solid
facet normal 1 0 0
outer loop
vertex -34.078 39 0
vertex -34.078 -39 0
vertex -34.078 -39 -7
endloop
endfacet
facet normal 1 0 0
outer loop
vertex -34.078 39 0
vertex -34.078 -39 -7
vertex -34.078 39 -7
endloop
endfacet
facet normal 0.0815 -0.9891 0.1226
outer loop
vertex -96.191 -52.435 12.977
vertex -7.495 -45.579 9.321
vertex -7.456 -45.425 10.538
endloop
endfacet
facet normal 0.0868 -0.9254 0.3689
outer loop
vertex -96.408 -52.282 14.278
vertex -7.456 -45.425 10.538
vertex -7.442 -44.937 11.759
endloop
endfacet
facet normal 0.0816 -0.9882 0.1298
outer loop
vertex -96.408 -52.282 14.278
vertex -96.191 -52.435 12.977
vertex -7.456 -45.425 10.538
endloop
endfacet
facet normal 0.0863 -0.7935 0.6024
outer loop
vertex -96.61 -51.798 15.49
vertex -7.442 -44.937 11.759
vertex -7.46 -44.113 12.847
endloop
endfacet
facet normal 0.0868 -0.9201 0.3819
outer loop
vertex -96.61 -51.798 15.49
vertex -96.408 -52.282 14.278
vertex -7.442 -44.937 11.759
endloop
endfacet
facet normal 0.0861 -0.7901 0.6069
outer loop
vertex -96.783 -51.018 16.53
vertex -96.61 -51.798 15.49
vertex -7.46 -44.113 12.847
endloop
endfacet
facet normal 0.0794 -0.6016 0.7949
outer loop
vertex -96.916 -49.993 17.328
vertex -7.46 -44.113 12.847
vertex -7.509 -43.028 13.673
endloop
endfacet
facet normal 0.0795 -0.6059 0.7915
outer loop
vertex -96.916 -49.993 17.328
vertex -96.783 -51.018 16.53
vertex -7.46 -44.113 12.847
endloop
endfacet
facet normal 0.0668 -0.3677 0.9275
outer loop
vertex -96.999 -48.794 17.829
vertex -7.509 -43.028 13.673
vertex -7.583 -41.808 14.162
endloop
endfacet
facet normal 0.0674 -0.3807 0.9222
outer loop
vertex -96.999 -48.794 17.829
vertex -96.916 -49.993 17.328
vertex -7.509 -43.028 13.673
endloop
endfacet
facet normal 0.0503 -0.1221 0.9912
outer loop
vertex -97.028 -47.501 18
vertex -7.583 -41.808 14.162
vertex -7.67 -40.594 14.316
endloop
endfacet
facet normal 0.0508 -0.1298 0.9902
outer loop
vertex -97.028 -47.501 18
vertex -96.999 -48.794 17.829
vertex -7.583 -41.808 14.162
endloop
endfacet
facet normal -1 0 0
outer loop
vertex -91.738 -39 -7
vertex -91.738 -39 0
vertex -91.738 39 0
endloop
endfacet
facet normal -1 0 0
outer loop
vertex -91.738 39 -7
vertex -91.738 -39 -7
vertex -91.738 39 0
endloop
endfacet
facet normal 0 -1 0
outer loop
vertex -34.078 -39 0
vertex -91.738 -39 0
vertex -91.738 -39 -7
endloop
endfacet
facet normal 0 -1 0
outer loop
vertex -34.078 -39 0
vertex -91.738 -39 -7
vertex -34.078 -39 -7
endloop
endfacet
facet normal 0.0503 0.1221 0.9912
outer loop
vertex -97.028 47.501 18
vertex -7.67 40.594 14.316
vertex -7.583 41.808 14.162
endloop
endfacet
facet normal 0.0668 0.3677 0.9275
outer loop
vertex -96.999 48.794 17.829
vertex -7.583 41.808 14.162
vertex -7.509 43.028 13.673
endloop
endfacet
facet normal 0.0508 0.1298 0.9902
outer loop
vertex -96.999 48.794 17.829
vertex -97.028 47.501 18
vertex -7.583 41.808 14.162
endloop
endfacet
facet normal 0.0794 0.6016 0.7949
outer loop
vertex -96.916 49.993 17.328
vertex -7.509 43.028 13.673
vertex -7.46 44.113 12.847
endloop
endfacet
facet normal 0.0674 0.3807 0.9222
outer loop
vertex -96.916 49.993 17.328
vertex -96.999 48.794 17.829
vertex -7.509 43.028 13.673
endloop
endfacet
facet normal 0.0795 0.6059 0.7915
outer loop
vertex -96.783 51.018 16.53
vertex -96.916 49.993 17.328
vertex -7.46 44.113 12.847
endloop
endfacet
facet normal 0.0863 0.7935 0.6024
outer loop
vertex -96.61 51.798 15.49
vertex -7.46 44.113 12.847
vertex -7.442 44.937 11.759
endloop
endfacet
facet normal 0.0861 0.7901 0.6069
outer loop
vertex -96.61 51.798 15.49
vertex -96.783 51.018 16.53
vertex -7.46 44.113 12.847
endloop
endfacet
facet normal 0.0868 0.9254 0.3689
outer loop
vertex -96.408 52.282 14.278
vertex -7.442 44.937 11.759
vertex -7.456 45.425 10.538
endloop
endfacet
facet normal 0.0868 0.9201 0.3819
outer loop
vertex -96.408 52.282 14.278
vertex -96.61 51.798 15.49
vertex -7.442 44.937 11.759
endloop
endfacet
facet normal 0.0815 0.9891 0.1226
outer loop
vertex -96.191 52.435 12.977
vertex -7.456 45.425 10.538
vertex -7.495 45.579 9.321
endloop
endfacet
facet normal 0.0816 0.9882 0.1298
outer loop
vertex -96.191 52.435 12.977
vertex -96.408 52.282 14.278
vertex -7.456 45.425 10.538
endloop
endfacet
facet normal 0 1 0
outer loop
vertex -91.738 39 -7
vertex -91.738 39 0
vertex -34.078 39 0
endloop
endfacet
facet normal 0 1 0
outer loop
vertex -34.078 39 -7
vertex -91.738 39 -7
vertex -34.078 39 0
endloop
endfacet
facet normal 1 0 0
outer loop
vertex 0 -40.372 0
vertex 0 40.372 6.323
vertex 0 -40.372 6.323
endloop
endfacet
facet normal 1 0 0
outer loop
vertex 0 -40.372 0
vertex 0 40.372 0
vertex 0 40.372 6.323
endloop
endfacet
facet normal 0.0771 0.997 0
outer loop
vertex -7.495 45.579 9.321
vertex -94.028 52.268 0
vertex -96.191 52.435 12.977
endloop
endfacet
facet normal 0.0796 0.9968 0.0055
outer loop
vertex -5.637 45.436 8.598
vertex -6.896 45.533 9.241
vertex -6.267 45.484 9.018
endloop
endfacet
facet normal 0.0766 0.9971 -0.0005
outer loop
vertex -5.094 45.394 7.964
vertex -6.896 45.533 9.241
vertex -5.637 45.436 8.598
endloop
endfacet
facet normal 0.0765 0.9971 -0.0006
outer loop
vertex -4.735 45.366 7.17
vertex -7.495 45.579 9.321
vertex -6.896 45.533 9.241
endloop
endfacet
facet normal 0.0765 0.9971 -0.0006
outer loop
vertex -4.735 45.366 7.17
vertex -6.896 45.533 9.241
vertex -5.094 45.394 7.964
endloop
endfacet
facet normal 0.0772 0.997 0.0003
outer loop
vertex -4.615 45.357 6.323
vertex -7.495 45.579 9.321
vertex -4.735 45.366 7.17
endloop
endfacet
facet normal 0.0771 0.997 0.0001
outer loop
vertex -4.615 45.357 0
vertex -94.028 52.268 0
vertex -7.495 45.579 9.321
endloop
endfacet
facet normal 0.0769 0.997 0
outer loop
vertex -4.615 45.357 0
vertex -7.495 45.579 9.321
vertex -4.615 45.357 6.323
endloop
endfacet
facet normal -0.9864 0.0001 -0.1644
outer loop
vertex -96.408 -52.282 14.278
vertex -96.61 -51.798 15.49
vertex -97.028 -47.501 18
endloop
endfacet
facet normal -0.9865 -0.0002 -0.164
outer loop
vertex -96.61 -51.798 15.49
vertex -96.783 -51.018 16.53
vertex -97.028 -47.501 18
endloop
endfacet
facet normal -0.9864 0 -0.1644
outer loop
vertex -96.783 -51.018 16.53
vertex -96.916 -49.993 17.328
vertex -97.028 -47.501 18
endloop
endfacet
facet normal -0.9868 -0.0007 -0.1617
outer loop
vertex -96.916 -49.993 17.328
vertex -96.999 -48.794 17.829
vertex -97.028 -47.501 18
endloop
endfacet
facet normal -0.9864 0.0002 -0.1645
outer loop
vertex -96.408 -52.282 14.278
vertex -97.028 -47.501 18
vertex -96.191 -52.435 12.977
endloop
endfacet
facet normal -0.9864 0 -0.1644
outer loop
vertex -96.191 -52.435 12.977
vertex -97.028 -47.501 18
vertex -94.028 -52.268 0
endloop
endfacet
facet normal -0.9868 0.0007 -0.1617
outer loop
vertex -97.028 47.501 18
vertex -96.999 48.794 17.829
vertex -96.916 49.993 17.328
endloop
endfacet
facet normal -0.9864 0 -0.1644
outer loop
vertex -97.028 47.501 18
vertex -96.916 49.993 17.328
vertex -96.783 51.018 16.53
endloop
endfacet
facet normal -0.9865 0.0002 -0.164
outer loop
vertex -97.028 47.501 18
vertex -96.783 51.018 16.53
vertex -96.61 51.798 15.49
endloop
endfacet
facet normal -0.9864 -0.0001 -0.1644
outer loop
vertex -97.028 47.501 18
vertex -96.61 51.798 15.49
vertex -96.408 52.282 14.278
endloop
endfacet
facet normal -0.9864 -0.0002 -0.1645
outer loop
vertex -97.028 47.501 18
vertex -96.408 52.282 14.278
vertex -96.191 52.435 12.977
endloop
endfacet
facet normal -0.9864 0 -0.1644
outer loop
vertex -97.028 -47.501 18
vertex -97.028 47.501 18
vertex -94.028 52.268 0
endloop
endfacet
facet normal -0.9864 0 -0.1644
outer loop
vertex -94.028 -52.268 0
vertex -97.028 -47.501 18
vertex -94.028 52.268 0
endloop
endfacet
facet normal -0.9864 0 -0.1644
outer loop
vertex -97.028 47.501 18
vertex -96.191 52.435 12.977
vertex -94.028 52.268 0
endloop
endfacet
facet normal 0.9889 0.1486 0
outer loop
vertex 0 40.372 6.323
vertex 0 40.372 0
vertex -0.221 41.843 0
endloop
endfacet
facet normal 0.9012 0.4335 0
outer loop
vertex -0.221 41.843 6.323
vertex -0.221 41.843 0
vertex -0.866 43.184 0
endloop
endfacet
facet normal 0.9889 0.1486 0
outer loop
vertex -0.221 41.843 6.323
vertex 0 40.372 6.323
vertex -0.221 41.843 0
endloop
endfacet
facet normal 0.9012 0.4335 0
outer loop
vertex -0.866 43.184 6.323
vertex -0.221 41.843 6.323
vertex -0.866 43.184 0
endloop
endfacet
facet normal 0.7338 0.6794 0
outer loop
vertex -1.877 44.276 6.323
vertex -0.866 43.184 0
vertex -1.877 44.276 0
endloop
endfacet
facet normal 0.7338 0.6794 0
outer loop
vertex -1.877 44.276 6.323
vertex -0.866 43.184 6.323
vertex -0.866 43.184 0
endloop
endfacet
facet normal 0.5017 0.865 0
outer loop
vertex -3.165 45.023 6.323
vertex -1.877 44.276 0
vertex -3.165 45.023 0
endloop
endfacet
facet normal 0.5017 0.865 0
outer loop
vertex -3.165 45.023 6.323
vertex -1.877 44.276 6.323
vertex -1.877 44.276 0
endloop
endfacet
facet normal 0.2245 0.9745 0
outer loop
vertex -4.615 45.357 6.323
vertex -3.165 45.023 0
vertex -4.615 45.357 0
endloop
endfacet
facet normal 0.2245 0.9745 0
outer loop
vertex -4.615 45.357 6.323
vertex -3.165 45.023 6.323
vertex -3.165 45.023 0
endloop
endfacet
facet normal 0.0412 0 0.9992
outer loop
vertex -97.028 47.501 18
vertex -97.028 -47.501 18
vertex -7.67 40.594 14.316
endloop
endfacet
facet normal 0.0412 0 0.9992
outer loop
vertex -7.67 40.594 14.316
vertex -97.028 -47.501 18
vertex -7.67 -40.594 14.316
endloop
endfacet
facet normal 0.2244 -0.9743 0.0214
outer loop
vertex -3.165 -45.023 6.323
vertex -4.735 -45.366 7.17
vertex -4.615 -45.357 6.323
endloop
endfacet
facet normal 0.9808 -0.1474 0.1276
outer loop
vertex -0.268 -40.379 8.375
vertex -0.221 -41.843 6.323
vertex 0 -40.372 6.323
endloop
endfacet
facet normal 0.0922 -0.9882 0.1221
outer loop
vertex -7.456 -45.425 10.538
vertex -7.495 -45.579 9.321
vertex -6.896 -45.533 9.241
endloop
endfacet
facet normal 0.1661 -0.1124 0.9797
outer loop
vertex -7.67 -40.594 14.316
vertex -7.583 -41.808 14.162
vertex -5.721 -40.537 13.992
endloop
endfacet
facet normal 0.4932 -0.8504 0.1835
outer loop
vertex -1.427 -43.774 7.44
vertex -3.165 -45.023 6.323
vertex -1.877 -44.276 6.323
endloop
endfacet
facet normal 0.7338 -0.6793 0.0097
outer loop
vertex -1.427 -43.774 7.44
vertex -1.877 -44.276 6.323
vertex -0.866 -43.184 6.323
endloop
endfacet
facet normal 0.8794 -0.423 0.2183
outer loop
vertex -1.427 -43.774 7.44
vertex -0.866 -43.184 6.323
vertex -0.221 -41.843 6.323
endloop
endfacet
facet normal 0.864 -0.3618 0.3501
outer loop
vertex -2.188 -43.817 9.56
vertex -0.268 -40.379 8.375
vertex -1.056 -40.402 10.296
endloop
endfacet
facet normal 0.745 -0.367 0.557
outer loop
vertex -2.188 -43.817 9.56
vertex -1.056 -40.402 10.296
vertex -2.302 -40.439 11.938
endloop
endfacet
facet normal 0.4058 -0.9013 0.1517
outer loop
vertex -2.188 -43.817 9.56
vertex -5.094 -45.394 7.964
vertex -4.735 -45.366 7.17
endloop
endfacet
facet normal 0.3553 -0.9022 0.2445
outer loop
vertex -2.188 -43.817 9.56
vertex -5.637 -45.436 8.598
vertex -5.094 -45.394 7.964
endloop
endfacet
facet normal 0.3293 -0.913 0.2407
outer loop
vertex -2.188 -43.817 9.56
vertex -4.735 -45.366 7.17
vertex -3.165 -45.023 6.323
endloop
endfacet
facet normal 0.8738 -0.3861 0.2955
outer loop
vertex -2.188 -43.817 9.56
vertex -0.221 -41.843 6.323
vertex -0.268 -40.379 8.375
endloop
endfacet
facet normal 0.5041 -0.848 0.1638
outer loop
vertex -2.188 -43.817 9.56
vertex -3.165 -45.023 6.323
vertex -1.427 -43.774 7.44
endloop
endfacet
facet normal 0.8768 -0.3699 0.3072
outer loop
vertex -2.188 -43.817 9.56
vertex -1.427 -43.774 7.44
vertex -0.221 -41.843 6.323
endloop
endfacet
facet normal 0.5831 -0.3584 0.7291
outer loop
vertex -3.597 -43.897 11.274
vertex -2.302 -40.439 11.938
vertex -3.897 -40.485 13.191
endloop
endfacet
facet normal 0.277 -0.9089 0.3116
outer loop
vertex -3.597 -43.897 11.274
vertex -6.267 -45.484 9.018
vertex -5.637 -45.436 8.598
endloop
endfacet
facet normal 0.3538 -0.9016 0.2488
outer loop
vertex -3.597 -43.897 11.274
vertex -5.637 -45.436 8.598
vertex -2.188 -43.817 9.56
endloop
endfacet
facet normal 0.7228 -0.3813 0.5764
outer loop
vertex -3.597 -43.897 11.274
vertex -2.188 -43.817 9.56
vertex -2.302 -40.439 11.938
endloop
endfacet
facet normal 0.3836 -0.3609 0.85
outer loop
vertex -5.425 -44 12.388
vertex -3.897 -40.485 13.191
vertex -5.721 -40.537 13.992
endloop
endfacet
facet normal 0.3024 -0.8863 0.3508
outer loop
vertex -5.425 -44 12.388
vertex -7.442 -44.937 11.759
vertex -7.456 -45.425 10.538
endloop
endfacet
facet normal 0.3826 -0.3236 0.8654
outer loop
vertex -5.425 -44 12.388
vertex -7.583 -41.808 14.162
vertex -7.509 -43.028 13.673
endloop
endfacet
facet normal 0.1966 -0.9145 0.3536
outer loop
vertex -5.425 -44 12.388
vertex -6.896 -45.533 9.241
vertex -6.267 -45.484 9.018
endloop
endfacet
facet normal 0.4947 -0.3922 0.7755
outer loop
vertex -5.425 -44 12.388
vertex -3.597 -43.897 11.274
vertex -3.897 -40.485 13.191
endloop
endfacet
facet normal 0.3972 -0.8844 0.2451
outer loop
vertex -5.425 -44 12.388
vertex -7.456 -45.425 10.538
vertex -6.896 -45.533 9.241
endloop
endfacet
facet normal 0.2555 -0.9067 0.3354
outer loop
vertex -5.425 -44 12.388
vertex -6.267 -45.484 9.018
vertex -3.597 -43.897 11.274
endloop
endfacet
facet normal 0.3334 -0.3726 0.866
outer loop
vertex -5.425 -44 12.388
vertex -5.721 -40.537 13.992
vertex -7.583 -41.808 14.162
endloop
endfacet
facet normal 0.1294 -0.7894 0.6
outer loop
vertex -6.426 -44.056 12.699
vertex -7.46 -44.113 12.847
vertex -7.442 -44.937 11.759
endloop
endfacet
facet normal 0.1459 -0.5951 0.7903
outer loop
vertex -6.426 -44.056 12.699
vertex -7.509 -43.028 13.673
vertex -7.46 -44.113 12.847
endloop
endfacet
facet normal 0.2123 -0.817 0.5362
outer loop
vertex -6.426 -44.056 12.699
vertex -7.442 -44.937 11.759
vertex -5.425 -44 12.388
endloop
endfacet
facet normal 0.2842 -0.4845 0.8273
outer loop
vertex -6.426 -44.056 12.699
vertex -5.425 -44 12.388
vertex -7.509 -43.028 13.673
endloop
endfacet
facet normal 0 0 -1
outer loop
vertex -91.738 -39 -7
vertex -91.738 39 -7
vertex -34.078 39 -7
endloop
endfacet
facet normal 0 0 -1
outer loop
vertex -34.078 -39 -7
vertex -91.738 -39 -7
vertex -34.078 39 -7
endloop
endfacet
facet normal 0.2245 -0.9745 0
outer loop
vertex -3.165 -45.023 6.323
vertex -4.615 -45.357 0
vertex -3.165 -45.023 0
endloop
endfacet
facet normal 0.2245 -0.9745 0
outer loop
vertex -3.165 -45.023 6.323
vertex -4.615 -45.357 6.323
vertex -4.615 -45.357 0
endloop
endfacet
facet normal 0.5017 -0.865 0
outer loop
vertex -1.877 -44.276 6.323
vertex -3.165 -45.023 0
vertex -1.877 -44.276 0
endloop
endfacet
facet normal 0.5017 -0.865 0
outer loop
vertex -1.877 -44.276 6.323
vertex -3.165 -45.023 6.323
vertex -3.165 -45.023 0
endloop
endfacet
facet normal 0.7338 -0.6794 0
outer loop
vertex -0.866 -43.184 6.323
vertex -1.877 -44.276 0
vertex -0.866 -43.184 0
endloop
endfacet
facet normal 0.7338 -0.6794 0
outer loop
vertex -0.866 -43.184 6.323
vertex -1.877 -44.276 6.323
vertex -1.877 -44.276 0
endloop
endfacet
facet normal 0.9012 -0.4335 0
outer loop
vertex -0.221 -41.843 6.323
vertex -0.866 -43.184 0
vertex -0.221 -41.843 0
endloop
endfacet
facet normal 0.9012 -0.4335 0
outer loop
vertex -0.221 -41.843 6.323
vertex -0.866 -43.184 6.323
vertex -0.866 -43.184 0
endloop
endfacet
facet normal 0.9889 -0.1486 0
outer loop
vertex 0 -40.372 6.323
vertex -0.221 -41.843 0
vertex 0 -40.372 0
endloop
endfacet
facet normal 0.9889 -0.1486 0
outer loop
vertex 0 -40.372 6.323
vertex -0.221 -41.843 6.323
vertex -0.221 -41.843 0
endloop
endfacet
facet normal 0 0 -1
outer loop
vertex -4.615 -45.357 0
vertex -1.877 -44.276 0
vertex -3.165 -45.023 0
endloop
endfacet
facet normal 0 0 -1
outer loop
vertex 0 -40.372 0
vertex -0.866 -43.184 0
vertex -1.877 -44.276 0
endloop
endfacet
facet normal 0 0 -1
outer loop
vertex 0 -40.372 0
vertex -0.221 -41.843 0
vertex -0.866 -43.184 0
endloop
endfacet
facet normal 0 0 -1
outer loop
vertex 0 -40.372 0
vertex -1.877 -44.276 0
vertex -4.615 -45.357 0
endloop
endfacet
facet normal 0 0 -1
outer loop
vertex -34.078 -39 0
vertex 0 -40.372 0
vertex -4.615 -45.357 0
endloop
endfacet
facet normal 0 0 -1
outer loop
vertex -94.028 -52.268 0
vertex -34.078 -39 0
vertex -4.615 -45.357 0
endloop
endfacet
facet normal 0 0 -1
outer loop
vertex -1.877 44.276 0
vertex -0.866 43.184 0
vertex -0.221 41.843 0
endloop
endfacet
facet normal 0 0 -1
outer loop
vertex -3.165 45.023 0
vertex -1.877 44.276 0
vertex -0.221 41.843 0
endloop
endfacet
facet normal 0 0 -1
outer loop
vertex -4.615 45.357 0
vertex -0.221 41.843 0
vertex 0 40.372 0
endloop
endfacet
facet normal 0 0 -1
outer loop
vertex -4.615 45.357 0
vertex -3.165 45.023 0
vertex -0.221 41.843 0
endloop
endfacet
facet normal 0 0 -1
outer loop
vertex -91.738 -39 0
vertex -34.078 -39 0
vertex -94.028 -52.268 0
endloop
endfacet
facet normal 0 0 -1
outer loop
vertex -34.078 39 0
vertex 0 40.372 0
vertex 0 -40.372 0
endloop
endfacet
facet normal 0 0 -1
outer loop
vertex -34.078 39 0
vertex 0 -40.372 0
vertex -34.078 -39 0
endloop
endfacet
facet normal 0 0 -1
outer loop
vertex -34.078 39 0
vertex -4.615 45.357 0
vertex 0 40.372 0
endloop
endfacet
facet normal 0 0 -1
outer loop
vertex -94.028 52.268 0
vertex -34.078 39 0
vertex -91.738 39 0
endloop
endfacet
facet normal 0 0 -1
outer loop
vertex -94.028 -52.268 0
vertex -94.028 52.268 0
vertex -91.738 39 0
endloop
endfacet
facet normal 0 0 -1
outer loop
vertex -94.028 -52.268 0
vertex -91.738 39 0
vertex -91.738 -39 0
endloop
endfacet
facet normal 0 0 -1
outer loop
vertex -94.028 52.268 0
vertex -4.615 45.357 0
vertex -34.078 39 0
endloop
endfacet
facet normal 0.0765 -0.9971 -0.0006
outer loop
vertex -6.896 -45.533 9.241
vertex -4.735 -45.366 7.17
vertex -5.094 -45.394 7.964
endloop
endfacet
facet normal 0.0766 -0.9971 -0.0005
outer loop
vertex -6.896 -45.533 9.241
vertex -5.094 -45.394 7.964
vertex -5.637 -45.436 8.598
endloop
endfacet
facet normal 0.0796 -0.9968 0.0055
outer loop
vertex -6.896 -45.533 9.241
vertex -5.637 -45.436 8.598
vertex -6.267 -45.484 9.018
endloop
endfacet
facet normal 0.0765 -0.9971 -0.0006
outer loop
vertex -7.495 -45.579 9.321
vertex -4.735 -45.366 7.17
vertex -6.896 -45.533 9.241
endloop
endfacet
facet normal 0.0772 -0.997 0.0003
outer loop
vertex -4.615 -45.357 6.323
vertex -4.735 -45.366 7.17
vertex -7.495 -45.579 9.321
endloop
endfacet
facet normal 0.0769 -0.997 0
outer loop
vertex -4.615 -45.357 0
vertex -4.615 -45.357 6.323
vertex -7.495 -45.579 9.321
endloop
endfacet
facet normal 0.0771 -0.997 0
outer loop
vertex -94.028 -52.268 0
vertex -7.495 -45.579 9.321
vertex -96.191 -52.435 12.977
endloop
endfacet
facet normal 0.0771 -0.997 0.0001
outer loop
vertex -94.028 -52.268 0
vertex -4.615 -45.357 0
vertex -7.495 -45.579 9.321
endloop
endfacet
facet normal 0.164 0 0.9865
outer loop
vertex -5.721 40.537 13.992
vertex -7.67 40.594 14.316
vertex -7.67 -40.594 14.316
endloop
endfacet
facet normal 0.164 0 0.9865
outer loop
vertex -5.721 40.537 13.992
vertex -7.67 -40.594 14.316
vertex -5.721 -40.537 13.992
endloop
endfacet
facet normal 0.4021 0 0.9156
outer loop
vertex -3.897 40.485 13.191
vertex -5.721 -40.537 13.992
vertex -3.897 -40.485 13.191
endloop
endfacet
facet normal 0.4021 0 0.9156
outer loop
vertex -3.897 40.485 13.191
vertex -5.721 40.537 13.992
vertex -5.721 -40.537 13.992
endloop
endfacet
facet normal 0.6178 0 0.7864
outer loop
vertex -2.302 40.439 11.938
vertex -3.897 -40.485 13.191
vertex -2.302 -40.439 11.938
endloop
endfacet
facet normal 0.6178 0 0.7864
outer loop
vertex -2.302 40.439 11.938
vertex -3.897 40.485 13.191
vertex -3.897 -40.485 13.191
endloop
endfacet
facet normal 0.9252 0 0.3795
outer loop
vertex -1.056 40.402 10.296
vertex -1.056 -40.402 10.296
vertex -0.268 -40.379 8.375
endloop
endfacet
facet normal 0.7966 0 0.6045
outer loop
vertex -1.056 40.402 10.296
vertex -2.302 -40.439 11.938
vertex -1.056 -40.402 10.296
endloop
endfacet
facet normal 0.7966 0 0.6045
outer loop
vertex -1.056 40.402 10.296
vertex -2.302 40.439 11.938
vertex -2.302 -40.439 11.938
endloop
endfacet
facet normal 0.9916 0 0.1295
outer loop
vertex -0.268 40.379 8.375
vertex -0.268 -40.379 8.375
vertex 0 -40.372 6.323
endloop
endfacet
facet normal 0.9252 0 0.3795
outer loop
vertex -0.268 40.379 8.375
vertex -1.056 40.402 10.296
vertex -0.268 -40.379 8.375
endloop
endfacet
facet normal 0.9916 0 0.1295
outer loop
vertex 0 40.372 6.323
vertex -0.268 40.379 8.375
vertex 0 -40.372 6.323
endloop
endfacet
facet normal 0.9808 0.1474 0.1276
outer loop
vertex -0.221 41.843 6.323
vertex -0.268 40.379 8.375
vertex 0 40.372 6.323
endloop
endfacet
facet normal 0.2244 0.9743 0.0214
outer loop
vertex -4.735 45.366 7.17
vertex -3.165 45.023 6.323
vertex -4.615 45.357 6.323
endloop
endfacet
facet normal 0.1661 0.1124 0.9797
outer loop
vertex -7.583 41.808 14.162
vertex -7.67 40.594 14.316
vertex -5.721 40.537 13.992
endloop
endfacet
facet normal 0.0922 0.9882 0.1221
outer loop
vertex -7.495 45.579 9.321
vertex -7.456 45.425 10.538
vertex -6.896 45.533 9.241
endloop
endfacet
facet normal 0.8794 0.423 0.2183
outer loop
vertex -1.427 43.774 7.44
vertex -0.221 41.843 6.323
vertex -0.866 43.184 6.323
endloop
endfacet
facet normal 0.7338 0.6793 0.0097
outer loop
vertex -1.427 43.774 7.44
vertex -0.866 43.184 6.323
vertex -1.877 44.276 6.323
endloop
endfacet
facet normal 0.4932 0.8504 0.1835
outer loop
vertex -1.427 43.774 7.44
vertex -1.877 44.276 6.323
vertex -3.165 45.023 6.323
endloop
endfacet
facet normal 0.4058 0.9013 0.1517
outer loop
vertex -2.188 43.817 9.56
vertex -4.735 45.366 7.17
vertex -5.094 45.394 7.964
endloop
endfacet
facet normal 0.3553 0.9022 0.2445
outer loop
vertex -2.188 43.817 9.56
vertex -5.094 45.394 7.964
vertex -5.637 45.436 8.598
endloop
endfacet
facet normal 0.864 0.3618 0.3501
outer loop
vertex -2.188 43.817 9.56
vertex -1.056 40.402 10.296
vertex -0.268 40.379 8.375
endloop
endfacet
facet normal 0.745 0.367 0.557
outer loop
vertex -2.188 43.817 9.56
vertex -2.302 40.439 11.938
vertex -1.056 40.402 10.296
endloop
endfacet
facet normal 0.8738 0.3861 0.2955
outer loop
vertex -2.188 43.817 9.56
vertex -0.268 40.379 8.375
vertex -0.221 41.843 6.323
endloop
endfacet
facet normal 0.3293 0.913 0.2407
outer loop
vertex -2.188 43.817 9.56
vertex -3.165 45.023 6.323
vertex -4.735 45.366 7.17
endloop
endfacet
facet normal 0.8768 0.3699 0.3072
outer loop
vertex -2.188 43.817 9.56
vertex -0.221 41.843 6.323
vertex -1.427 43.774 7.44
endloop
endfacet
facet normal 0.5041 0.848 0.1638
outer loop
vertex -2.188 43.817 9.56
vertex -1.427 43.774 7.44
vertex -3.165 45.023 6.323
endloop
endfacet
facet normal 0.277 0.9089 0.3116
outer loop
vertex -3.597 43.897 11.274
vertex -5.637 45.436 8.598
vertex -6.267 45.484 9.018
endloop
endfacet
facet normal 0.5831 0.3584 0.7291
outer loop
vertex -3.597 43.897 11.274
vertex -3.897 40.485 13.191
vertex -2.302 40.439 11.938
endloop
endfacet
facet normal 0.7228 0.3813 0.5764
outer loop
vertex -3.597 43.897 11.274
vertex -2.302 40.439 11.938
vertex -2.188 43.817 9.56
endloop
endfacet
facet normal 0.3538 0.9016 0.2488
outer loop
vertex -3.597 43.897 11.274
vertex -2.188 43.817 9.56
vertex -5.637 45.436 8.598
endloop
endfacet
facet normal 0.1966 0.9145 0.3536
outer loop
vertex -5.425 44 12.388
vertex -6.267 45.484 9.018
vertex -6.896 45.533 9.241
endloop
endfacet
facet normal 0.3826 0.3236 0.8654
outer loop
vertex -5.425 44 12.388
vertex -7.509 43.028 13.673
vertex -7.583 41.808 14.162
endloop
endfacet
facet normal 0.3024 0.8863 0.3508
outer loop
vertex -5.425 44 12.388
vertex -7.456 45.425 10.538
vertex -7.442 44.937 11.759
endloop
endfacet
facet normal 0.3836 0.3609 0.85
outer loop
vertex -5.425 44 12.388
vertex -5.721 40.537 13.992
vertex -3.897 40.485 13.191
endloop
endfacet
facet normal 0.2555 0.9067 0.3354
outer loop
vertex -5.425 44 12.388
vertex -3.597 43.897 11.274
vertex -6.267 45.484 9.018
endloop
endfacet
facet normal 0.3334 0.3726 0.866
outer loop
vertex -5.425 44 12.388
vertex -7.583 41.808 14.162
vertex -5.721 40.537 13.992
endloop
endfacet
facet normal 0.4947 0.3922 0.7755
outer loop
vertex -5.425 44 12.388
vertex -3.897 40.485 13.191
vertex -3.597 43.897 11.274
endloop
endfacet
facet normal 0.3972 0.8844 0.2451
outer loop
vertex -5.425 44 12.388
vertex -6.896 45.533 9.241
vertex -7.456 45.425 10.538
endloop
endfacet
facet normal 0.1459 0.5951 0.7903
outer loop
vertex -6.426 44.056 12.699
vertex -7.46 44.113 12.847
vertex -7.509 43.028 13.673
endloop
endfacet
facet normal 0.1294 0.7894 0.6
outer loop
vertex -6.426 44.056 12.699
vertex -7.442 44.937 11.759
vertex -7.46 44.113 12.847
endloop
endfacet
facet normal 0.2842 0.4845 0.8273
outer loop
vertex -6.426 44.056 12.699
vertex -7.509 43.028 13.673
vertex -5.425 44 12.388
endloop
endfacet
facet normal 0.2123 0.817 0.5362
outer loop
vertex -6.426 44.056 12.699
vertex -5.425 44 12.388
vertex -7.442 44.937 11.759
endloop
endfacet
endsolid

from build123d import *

# Parameters (mm, degrees)
PAD_DEPTH            = 18
POCKET_DEPTH         = 52.501
POCKET_DEPTH_BACK    = -52.501
POCKET001_DEPTH      = 52.501
POCKET001_DEPTH_BACK = -52.501
SKETCH003_W          = 57.660323
SKETCH003_H          = 78
PAD001_DEPTH         = 7
FILLET_R             = 8
FILLET001_R          = 5


with BuildPart() as part:
    # Sketch → Pad (new body)
    with BuildSketch(Plane.XY):
        Polygon((-97.028, -52.5), (-97.028, 52.5), (0, 45), (0, -45), align=None)
    extrude(amount=PAD_DEPTH)

    # Sketch001 → Pocket (cut, two sides)
    with BuildSketch(Plane(origin=(-97.028, 0, 0), x_dir=(1, 0, 0), z_dir=(0, -1, 0))) as pocket_sk:
        Polygon((0, 18), (3, 0), (0, 0), align=None)
    extrude(amount=-POCKET_DEPTH, mode=Mode.SUBTRACT)
    extrude(pocket_sk.sketch, amount=-POCKET_DEPTH_BACK, mode=Mode.SUBTRACT)

    # Sketch002 → Pocket001 (cut, two sides)
    with BuildSketch(Plane.XZ) as pocket001_sk:
        Polygon((-97.028, 18), (0, 14), (0, 18), align=None)
    extrude(amount=-POCKET001_DEPTH, mode=Mode.SUBTRACT)
    extrude(pocket001_sk.sketch, amount=-POCKET001_DEPTH_BACK, mode=Mode.SUBTRACT)

    # Sketch003 → Pad001 (join)
    with BuildSketch(Plane.XY):
        with Locations((-62.907697, 0)):
            Rectangle(SKETCH003_W, SKETCH003_H)
    extrude(amount=-PAD001_DEPTH)

    # Fillet
    fillet_edges = [part.edges().sort_by_distance(p)[0] for p in [
        (0, 0, 14),
    ]]
    fillet(fillet_edges, radius=FILLET_R)

    # Fillet001
    fillet001_edges = [part.edges().sort_by_distance(p)[0] for p in [
        (-52.349239, -49.046454, 16.158109),
        (-52.349239, 49.046454, 16.158109),
    ]]
    fillet(fillet001_edges, radius=FILLET001_R)


solid = part.part
